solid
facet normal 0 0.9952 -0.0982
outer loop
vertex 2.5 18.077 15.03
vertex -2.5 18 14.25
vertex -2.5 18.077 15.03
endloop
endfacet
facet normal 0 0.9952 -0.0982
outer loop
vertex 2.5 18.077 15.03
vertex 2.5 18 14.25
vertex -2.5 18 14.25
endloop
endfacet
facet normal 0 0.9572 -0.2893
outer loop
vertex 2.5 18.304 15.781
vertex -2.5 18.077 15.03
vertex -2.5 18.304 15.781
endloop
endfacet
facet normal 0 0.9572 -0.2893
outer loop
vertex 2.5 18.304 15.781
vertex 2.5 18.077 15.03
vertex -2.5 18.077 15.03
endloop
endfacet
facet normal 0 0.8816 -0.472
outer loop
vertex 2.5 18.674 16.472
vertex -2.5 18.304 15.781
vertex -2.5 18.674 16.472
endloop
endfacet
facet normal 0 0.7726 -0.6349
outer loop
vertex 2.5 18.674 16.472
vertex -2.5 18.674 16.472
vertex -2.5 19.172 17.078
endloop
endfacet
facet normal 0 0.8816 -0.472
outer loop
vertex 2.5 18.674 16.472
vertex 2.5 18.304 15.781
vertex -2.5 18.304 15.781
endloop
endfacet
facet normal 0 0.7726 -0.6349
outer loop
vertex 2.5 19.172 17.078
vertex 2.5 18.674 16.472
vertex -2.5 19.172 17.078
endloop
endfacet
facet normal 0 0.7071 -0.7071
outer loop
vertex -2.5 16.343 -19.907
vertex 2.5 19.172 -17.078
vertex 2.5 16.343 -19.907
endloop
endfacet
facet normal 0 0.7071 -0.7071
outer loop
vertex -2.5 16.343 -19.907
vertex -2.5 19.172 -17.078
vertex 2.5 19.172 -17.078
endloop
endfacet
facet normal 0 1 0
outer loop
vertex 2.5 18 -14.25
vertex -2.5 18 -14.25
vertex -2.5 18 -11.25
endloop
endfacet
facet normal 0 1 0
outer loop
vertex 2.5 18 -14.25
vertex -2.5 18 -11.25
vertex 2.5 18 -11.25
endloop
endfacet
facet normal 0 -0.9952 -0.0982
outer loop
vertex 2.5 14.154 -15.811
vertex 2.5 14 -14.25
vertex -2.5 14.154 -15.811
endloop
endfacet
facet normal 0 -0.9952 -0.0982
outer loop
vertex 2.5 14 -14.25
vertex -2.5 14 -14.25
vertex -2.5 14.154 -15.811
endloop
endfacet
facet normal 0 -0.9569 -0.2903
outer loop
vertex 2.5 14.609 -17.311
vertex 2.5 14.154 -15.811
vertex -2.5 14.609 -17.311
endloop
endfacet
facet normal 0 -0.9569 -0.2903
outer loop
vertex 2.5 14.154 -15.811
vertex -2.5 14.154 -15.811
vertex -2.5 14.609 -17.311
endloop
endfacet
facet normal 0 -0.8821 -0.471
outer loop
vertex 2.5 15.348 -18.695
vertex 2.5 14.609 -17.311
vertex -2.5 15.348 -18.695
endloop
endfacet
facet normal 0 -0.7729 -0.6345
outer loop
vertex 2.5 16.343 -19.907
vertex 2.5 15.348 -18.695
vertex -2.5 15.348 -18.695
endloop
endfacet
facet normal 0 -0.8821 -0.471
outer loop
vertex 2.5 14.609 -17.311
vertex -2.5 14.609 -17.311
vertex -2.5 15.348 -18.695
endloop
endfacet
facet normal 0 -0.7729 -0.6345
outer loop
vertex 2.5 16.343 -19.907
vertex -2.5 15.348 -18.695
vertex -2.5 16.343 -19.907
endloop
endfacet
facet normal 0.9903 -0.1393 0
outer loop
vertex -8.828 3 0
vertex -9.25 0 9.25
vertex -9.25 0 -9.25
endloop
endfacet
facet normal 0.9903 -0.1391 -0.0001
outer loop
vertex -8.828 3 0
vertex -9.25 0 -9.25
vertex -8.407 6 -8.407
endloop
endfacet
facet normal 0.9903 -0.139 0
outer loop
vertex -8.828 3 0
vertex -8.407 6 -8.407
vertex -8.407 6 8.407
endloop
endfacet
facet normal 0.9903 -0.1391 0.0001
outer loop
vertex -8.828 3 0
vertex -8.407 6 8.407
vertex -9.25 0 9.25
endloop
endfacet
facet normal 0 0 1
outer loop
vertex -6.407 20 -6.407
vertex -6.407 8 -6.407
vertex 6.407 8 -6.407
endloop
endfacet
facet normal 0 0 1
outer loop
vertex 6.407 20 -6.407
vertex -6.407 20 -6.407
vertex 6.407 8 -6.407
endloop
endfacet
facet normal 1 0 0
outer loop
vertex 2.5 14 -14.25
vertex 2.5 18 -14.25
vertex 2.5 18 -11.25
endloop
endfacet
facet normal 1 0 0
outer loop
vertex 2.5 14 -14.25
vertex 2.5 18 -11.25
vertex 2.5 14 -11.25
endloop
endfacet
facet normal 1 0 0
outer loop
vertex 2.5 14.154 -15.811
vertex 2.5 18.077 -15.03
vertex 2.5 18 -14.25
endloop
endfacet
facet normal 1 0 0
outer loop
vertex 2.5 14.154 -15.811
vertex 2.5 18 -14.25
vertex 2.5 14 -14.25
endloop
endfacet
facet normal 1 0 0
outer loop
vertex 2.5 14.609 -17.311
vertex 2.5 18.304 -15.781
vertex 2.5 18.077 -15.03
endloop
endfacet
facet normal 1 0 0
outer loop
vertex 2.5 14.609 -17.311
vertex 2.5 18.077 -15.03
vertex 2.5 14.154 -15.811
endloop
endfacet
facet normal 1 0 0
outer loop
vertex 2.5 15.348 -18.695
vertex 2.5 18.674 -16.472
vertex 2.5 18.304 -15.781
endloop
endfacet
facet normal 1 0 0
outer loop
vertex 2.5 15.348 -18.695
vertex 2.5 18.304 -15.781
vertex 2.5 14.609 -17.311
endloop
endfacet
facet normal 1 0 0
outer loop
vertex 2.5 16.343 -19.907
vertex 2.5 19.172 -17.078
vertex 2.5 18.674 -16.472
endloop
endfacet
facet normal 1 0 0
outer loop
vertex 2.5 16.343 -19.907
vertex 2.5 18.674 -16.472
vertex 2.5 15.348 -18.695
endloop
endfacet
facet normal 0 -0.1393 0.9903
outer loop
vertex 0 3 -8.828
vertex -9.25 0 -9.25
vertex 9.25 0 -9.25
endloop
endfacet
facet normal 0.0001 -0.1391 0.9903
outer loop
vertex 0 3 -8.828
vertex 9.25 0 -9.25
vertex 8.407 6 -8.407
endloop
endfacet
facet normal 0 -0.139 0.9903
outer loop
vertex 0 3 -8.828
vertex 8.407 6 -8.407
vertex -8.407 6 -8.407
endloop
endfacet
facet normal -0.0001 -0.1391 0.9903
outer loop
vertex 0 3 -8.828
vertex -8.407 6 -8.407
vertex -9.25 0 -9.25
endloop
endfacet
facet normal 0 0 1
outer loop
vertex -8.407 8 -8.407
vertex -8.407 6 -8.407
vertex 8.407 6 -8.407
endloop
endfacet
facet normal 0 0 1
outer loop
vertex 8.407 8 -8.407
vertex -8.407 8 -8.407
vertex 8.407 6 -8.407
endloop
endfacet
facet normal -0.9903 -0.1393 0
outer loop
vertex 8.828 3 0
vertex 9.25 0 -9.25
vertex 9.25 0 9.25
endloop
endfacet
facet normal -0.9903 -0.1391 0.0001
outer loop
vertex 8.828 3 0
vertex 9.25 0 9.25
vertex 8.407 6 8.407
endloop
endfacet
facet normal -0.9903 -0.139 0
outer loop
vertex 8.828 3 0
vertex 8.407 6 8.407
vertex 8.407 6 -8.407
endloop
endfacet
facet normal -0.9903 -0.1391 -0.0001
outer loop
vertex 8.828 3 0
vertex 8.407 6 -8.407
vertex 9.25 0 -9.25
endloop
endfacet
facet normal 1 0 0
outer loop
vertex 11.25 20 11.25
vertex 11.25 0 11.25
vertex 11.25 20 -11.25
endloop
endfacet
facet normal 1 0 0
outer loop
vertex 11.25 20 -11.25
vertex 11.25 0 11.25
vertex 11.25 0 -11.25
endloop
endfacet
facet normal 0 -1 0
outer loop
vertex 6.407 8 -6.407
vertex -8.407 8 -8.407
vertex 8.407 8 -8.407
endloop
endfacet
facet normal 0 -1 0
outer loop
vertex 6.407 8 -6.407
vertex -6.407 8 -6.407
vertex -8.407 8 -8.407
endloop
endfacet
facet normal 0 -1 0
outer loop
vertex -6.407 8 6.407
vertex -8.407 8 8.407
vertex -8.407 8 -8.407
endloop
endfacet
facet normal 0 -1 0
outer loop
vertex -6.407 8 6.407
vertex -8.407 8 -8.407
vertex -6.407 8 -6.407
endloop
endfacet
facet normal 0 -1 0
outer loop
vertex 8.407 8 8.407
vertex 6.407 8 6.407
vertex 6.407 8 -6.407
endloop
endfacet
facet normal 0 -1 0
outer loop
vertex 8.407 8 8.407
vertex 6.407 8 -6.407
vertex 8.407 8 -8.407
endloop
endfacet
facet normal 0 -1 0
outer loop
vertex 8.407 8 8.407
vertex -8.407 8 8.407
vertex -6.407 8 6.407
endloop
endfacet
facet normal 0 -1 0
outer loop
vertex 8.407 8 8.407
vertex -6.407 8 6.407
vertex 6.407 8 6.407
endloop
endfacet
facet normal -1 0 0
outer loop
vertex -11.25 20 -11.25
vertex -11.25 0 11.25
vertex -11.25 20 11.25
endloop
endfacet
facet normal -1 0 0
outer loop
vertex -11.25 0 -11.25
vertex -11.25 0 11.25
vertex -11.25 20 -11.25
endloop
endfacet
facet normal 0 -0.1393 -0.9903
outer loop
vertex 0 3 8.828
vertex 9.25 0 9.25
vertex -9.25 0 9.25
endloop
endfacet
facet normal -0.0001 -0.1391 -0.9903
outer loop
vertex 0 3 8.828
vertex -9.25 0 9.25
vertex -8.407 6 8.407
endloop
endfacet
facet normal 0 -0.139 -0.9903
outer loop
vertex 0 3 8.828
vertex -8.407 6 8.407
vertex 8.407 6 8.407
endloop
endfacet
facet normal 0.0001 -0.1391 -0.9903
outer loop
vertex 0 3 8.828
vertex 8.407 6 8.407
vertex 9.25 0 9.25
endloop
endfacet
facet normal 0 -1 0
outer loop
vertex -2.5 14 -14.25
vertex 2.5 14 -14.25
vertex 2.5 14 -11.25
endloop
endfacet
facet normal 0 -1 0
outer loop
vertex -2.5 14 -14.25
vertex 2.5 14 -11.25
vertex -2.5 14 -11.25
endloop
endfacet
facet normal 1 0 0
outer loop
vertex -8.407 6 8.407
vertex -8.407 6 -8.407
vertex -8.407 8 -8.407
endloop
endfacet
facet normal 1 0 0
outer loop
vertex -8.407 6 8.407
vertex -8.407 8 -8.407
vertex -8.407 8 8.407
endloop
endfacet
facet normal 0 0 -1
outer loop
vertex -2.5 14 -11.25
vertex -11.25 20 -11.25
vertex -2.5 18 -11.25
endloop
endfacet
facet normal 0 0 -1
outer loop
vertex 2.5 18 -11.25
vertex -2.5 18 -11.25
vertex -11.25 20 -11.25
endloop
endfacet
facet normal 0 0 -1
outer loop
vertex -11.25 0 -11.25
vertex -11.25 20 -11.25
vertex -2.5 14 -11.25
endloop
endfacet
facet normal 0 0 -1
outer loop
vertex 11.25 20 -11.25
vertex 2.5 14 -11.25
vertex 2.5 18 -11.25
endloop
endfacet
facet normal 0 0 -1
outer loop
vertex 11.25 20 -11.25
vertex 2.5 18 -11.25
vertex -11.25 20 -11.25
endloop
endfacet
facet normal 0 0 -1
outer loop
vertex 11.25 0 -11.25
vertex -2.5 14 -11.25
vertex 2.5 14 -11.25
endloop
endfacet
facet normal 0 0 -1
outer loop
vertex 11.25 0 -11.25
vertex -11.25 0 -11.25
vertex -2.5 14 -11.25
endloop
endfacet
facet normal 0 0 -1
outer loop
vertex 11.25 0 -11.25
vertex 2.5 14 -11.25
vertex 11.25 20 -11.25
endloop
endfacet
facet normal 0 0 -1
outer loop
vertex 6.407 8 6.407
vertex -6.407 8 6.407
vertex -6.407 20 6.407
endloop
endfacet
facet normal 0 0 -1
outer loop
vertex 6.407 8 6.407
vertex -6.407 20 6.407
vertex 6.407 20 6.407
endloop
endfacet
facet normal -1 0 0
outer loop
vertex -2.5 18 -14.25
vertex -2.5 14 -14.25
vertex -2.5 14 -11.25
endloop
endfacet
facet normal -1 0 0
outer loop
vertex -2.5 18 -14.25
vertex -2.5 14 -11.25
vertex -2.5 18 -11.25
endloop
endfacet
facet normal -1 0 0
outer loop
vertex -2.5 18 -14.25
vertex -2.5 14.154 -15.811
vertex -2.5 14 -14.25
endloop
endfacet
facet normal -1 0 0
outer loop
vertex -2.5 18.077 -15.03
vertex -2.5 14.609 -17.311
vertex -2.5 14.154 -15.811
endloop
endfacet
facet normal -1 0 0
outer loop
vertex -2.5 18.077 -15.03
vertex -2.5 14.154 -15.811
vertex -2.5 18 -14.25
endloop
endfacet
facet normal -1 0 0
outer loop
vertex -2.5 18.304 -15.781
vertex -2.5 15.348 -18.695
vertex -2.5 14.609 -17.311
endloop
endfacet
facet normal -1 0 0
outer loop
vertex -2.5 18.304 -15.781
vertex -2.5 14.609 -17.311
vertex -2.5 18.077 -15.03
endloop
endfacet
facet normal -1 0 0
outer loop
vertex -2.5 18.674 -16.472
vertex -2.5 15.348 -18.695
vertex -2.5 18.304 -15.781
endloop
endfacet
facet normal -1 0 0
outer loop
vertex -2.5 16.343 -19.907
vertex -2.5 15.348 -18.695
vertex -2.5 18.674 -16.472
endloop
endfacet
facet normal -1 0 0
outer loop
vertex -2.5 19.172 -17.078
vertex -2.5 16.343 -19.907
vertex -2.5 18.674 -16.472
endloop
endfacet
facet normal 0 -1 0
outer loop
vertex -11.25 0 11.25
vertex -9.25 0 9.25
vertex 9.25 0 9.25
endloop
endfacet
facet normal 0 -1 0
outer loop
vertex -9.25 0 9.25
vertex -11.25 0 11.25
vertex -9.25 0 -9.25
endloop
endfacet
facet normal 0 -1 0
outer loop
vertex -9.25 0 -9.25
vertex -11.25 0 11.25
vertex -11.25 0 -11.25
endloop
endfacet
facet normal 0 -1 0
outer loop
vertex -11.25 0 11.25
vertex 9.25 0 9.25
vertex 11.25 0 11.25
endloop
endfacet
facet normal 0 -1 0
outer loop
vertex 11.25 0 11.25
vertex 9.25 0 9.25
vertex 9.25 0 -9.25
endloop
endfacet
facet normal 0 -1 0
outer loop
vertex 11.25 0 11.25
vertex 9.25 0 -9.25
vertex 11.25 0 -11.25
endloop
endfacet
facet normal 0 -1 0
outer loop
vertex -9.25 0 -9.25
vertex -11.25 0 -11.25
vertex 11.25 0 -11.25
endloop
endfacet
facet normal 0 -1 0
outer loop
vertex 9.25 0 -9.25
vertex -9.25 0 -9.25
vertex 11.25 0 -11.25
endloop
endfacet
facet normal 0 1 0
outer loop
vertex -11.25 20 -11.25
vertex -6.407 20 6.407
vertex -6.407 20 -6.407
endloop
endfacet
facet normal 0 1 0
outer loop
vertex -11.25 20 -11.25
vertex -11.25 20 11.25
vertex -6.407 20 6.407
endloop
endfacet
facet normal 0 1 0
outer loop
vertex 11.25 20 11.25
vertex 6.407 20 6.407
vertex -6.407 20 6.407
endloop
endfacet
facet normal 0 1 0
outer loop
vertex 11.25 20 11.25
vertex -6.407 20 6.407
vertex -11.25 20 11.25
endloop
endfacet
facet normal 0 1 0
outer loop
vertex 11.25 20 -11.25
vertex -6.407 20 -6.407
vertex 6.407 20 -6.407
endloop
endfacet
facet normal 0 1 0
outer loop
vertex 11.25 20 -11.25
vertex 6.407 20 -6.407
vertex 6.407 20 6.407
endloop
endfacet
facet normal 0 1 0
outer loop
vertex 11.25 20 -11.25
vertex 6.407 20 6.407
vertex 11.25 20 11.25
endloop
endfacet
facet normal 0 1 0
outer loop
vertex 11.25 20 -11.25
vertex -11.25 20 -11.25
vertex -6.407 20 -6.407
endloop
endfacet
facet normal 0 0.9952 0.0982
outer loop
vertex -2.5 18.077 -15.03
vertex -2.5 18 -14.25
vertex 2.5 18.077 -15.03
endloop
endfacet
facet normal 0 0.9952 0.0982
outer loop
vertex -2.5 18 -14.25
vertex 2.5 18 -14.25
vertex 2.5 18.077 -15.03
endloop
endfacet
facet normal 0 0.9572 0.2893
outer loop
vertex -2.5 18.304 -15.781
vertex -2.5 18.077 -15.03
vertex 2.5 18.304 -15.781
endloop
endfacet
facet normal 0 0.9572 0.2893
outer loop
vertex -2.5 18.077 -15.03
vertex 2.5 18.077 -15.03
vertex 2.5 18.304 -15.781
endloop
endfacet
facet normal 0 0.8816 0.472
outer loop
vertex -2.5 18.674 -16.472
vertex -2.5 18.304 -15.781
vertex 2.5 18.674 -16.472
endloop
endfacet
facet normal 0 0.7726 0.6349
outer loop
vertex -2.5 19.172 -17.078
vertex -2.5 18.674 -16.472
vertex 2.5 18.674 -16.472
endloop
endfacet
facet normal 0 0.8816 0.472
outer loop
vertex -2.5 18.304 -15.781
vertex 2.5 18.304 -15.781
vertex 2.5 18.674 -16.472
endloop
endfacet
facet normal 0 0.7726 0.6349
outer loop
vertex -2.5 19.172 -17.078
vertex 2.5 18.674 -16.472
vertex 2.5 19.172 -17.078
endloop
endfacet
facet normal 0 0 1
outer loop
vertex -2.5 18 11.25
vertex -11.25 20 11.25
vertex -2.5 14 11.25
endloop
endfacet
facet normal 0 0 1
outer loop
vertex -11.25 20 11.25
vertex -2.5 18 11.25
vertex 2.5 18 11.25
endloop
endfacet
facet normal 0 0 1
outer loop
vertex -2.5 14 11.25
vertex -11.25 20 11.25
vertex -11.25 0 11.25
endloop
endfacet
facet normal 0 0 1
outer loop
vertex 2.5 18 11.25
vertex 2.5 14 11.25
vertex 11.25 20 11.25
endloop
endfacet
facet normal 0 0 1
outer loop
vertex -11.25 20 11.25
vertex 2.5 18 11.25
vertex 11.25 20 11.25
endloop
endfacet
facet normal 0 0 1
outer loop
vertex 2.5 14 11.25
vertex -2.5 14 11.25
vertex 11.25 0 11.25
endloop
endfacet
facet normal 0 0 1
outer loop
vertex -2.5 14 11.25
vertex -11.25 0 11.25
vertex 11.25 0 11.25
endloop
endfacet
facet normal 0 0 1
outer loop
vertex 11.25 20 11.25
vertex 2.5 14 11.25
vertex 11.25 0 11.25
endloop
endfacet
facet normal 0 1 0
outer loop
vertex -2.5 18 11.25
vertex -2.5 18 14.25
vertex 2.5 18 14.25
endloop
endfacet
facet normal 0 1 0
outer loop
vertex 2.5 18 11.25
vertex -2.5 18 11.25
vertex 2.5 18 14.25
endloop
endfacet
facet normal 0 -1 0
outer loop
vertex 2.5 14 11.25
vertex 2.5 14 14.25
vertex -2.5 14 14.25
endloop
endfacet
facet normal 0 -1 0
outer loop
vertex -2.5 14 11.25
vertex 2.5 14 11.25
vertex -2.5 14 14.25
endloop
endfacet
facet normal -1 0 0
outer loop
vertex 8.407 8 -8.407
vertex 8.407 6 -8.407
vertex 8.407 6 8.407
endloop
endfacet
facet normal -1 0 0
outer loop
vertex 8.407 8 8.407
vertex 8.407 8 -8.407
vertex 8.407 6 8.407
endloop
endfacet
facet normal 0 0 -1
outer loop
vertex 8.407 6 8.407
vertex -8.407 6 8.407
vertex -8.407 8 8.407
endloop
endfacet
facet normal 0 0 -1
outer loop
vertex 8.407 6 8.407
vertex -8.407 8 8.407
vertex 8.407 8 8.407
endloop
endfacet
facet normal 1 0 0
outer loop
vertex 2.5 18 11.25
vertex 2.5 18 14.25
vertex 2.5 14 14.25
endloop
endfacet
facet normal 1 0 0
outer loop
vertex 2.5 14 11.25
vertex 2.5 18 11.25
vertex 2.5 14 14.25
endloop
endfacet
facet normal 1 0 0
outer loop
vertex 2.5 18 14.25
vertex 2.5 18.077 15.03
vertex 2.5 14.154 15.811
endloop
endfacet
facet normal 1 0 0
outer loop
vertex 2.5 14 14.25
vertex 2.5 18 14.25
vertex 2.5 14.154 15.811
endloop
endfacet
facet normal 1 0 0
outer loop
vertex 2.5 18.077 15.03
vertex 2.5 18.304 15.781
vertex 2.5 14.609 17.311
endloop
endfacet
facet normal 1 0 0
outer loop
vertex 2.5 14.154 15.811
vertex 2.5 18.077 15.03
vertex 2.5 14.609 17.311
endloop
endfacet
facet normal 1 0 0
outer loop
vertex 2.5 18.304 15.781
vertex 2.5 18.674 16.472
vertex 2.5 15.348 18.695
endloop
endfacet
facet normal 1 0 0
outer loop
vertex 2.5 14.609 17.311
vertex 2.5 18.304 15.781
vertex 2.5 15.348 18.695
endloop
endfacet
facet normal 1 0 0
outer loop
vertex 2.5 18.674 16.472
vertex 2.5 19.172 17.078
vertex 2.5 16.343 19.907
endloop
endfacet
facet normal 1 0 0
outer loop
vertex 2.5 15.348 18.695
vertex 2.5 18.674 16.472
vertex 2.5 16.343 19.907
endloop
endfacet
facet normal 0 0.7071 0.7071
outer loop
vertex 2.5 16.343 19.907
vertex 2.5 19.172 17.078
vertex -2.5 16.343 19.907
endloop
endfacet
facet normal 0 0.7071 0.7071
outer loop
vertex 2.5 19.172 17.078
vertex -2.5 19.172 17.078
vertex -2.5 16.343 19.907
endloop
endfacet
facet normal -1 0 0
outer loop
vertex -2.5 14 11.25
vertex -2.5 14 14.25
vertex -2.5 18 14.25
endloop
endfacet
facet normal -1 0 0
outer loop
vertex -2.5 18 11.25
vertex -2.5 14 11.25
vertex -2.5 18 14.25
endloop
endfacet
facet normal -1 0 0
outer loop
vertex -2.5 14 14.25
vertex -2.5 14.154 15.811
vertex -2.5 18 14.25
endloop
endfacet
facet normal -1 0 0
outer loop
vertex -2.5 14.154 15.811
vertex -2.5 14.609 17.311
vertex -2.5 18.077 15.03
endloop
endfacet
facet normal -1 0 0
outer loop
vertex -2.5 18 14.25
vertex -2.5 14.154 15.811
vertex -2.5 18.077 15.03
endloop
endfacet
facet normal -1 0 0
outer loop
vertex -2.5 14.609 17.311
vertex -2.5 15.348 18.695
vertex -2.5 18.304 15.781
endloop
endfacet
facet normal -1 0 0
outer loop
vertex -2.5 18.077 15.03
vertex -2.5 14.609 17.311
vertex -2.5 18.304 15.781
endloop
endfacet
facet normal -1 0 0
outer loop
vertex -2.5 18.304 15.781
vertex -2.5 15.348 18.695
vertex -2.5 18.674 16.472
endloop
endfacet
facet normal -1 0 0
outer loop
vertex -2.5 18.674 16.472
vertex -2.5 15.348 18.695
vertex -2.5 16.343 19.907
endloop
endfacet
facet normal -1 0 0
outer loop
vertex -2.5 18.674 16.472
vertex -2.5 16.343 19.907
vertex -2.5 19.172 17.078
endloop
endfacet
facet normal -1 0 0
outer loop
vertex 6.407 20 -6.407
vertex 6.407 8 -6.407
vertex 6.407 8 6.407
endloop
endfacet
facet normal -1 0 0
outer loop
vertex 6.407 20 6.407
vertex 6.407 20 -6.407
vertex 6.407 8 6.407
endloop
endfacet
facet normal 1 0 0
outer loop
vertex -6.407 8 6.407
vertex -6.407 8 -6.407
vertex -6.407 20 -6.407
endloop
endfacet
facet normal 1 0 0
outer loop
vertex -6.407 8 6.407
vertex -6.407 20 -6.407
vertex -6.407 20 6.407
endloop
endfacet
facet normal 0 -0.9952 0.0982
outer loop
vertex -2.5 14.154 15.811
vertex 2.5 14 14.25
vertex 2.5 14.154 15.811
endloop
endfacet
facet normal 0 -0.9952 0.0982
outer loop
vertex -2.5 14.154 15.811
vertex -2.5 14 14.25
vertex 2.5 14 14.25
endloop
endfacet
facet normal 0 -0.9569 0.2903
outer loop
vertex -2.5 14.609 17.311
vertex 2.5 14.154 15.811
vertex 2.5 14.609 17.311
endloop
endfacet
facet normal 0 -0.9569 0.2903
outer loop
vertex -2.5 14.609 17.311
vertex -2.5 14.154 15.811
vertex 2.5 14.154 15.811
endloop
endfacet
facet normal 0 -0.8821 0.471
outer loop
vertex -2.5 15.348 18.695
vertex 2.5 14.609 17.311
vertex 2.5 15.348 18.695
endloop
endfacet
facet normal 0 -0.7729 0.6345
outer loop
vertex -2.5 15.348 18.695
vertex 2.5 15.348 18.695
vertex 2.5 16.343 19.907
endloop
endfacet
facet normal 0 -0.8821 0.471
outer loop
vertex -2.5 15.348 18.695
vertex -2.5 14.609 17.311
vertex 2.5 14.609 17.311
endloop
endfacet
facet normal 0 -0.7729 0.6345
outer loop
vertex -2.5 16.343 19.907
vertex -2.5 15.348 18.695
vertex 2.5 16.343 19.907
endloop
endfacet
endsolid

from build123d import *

# Parameters (mm, degrees)
SKETCH1_W           = 22.5
SKETCH1_H           = 22.5
BOSS_EXTRUDE1_DEPTH = 20
SKETCH5_W           = 5
SKETCH5_H           = 4
SKETCH3_W           = 18.5
SKETCH3_H           = 18.5
CUT_EXTRUDE5_DEPTH  = 6
CUT_EXTRUDE5_TAPER  = 8
SKETCH14_W          = 16.813509984
SKETCH14_H          = 16.813509984
CUT_EXTRUDE6_DEPTH  = 2
CUT_EXTRUDE7_REACH  = 14
SKETCH15_W          = 12.813509984
SKETCH15_H          = 12.813509984


with BuildPart() as part:
    # Sketch1 → Boss-Extrude1 (new body)
    with BuildSketch(Plane(origin=(0, 0, 0), x_dir=(1, 0, 0), z_dir=(0, 1, 0))):
        Rectangle(SKETCH1_W, SKETCH1_H)
    extrude(amount=BOSS_EXTRUDE1_DEPTH)

    # Sweep1: sweep along a path in Sketch6
    with BuildLine(Plane(origin=(0, 0, 0), x_dir=(0, 0, -1), z_dir=(1, 0, 0))) as sweep1_path:
        Line((11.25, 16), (14.25, 16))
        ThreePointArc((14.25, 16), (16.546100594, 16.456722805), (18.492640687, 17.757359313))
    # Sketch5 → Sweep1 (sweep)
    with BuildSketch(Plane(origin=(0, 0, -11.25), x_dir=(-1, 0, 0), z_dir=(0, 0, -1))):
        with Locations((0, 16)):
            Rectangle(SKETCH5_W, SKETCH5_H)
    sweep1 = sweep(path=sweep1_path.line)

    # Mirror1: Sweep1 across plane
    add(sweep1.mirror(Plane.XY))

    # Sketch3 → Cut-Extrude5 (cut)
    with BuildSketch(Plane.XZ):
        Rectangle(SKETCH3_W, SKETCH3_H)
    extrude(amount=-CUT_EXTRUDE5_DEPTH, taper=CUT_EXTRUDE5_TAPER, mode=Mode.SUBTRACT)

    # Sketch14 → Cut-Extrude6 (cut)
    with BuildSketch(Plane.XZ.offset(-6)):
        Rectangle(SKETCH14_W, SKETCH14_H)
    extrude(amount=-CUT_EXTRUDE6_DEPTH, mode=Mode.SUBTRACT)

    # Sketch15 → Cut-Extrude7 (cut, up to next)
    with BuildSketch(Plane.XZ.offset(-8), mode=Mode.PRIVATE) as cut_extrude7_sk1:
        Rectangle(SKETCH15_W, SKETCH15_H)
    cut_extrude7_tool1 = extrude(cut_extrude7_sk1.sketch, amount=-CUT_EXTRUDE7_REACH, mode=Mode.PRIVATE) & part.part
    add(cut_extrude7_tool1.solids().sort_by_distance((0, 8, 0))[0], mode=Mode.SUBTRACT)


solid = part.part
